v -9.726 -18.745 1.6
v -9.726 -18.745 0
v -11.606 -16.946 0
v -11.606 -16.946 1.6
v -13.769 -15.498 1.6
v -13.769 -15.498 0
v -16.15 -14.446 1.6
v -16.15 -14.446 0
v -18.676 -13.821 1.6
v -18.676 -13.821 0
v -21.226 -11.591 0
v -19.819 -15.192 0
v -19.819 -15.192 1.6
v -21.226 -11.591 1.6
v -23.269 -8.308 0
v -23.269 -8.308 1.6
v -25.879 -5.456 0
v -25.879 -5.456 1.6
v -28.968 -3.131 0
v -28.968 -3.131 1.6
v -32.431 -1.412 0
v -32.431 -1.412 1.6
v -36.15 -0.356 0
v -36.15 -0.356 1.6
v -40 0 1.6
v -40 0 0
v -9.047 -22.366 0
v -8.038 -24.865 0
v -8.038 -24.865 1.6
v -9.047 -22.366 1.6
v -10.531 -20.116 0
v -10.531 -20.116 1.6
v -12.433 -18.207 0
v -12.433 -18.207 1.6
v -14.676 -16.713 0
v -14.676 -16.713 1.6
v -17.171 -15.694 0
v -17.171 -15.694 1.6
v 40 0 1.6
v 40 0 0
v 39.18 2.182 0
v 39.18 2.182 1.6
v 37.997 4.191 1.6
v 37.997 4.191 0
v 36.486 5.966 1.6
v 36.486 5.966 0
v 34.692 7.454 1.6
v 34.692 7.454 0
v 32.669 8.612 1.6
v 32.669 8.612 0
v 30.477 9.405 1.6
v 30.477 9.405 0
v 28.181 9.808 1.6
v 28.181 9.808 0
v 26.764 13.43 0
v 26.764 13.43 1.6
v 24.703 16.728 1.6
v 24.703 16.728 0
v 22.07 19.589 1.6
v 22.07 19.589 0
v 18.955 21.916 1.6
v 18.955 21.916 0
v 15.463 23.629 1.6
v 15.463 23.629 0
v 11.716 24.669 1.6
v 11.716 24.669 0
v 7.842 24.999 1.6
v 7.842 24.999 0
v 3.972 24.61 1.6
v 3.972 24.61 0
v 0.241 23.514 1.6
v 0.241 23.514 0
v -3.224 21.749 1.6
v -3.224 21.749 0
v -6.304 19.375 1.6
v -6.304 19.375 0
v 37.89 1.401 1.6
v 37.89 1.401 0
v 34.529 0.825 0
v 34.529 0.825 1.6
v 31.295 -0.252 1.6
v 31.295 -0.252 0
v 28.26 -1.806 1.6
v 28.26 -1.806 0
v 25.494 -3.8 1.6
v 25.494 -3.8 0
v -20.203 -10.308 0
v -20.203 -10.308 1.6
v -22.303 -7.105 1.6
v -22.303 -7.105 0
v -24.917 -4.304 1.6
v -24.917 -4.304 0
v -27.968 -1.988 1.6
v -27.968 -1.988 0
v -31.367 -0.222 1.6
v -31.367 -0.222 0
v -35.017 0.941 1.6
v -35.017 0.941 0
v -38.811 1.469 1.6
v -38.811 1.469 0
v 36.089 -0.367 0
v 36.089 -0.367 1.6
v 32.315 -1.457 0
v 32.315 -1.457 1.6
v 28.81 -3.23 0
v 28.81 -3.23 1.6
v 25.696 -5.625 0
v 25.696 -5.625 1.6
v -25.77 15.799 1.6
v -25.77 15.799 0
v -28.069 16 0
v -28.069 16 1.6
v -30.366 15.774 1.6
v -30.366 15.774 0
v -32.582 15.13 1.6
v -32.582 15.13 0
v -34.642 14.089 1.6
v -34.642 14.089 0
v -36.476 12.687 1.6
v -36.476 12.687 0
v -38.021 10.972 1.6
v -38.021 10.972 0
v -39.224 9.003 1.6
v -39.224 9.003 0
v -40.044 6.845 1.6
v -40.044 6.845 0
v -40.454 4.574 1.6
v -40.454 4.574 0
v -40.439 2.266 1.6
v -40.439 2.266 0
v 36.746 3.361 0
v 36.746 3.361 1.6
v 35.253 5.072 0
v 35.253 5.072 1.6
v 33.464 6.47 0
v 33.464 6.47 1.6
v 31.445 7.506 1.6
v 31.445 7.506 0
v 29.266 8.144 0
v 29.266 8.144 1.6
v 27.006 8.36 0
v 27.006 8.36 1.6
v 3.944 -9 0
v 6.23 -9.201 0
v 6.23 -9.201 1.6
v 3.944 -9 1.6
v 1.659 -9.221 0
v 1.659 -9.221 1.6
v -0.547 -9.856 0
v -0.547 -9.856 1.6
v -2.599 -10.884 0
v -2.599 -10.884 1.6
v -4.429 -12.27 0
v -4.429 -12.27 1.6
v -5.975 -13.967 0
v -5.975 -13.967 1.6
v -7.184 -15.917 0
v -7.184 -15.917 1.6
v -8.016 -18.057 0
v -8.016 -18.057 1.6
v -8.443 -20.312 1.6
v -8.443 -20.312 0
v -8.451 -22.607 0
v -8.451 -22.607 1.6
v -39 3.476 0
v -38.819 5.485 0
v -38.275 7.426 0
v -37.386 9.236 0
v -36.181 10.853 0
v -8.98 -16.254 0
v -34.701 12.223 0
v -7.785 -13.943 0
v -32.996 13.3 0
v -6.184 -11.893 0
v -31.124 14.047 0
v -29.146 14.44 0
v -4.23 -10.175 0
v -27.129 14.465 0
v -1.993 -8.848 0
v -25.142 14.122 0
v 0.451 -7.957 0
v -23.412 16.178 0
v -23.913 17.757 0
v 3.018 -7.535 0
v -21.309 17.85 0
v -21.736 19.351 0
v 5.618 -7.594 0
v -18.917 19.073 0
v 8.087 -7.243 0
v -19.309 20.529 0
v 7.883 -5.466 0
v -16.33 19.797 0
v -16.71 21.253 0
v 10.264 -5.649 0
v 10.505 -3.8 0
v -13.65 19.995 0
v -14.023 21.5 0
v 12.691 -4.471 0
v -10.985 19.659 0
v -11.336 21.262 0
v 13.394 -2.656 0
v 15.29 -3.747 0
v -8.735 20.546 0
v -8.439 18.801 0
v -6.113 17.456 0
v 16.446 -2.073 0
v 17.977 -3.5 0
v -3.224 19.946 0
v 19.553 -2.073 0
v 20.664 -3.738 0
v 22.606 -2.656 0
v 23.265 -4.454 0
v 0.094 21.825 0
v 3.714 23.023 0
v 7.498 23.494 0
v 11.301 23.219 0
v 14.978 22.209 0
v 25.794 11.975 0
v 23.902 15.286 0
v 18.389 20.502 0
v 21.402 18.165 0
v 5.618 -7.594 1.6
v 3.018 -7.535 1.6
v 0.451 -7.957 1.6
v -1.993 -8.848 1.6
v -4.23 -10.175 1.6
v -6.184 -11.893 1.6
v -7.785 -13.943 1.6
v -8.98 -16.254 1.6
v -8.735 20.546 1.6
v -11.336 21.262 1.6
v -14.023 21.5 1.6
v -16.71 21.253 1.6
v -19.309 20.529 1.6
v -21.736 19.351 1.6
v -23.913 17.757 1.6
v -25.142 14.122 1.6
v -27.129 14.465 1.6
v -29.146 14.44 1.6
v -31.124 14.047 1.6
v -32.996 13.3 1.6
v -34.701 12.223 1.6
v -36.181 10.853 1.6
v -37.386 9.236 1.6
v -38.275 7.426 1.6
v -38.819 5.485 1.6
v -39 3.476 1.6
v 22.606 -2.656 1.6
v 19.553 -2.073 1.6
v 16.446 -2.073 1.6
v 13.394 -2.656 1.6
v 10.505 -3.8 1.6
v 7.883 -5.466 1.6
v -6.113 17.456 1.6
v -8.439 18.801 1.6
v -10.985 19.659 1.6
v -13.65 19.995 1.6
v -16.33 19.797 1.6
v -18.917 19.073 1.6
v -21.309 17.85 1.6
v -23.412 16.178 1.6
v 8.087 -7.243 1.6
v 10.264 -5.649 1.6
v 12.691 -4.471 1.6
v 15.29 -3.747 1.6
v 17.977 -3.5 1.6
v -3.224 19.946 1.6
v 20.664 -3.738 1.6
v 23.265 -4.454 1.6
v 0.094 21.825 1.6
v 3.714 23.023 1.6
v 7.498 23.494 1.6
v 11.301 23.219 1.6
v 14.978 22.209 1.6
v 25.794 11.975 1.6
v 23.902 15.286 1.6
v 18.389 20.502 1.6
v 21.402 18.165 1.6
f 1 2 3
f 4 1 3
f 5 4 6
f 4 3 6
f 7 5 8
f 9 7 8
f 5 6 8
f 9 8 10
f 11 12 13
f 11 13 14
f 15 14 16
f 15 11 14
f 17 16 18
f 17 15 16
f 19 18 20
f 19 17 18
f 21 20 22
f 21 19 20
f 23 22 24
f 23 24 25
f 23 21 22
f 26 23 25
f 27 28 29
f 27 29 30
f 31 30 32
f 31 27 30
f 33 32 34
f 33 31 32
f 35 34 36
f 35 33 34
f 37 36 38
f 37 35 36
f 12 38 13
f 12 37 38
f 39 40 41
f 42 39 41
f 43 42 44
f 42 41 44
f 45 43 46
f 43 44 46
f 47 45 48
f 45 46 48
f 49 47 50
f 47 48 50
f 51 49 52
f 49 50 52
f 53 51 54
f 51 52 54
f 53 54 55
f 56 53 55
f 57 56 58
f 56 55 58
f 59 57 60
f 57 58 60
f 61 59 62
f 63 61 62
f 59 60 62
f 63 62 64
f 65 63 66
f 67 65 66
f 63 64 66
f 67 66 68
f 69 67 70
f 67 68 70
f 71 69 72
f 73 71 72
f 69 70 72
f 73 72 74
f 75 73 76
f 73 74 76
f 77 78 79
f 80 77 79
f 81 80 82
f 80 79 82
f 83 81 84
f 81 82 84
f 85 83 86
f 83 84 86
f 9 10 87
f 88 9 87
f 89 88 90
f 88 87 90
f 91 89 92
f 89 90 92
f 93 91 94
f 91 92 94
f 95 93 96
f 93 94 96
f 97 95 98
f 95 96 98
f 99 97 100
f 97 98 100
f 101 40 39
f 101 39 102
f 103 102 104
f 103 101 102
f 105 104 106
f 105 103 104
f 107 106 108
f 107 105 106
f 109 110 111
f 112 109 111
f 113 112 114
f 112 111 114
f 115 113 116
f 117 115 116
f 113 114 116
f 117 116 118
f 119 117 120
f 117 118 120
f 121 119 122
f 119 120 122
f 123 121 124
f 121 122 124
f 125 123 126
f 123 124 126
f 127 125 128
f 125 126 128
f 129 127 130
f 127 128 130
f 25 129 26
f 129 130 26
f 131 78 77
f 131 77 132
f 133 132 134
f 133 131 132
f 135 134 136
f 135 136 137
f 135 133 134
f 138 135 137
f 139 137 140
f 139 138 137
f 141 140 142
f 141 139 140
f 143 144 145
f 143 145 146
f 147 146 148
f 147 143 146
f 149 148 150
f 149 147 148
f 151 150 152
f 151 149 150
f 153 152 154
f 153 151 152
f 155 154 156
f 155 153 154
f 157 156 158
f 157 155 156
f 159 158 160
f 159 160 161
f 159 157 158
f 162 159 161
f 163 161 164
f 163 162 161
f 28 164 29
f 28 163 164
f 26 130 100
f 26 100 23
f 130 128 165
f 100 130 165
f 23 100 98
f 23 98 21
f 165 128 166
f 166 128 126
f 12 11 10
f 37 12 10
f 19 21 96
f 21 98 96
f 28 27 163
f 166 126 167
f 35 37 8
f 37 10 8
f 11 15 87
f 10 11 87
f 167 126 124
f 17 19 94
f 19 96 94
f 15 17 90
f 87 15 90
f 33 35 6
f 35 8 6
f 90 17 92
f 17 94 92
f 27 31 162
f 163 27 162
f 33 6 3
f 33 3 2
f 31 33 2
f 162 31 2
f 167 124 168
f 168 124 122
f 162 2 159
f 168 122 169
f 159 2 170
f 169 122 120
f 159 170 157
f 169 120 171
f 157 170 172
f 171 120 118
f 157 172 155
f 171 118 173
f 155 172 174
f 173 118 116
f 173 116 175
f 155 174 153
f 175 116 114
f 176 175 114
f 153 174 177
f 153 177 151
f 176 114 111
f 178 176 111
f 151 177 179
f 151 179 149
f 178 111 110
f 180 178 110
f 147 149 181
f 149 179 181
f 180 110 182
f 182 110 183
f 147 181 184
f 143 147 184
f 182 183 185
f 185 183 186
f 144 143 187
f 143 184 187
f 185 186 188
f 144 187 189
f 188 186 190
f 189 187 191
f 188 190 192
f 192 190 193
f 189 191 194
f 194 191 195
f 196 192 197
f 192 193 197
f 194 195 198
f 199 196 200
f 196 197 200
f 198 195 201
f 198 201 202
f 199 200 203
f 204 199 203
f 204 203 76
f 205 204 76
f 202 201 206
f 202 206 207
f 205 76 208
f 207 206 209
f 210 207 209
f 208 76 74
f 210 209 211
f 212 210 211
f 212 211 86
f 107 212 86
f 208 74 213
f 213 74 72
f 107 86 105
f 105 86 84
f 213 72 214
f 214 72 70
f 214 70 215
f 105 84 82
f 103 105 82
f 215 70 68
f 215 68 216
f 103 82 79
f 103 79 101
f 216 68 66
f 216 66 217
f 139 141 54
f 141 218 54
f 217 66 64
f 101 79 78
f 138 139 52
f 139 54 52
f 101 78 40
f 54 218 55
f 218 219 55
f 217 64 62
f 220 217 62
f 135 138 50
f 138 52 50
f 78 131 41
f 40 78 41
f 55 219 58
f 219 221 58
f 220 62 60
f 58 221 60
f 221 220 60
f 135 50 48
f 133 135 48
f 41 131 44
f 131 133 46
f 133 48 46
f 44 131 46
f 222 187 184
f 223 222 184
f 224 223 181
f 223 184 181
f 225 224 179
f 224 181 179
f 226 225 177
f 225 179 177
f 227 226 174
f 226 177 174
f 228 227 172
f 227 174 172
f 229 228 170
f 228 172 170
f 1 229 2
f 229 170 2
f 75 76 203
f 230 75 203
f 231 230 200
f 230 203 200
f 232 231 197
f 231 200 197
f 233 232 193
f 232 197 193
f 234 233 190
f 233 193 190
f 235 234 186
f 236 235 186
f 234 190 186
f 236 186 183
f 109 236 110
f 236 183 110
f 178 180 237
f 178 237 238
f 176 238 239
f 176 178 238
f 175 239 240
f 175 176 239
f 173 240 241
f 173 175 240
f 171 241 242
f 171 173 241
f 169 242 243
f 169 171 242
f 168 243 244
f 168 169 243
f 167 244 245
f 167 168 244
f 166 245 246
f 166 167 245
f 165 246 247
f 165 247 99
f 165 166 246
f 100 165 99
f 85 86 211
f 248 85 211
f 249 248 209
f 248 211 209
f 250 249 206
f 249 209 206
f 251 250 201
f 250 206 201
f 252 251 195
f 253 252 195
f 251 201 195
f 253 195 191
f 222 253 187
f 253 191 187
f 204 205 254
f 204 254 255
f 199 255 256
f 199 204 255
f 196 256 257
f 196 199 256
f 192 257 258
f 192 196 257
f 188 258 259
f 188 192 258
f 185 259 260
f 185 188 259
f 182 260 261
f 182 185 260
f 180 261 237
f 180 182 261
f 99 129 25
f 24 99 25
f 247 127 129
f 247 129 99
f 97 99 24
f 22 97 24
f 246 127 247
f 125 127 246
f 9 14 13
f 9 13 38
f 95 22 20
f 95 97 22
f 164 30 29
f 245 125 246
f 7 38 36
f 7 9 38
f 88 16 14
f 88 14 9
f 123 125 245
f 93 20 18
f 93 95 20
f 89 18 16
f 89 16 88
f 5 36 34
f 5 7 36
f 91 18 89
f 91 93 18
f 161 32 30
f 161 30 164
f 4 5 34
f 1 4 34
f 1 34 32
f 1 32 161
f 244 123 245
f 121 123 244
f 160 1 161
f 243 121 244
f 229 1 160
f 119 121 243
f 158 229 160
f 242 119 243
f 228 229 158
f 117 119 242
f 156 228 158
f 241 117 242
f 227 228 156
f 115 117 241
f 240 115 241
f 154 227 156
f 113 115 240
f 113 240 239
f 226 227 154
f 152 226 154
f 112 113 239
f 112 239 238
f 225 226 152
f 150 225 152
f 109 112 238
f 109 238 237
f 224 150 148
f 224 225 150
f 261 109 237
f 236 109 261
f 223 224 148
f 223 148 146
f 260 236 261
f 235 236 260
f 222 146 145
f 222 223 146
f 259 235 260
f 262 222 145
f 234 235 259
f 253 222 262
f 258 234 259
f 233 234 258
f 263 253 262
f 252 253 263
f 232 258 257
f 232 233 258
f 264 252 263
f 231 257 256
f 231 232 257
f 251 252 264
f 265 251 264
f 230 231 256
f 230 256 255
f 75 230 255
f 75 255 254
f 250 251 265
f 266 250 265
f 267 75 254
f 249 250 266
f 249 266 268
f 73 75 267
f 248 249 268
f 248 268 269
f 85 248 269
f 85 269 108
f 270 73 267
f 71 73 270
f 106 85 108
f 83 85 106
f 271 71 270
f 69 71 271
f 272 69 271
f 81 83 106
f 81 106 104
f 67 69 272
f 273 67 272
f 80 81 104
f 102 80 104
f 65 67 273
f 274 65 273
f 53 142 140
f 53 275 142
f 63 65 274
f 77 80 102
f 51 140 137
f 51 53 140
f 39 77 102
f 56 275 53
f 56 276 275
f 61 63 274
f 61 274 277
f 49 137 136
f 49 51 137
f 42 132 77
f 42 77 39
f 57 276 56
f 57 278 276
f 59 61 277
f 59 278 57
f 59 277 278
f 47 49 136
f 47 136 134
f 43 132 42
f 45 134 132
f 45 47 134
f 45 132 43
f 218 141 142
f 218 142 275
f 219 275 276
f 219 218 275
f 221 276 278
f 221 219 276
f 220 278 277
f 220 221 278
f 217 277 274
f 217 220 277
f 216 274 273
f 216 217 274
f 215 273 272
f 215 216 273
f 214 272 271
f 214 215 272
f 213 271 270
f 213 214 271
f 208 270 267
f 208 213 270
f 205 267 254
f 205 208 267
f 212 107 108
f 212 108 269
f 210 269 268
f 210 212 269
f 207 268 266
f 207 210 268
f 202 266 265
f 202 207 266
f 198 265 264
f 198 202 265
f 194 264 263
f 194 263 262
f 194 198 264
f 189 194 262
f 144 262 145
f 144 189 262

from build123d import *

# Parameters (mm, degrees)
PAD_DEPTH = 1.6


with BuildPart() as part:
    # Sketch → Pad (new body)
    with BuildSketch(Plane.XY):
        with BuildLine():
            ThreePointArc((28.180802, 9.808205), (13.613929, 24.235706), (-6.303954, 19.375204))
            ThreePointArc((-6.303954, 19.375204), (-16.710147, 21.253139), (-25.769512, 15.799387))
            ThreePointArc((-25.769512, 15.799387), (-37.287949, 11.865644), (-40, 0))
            ThreePointArc((-19.819198, -15.191795), (-27.370121, -4.222451), (-40, 0))
            ThreePointArc((-8.038434, -24.865429), (-12.432827, -18.206764), (-19.819198, -15.191795))
            ThreePointArc((6.230488, -9.200613), (-5.240972, -13.082492), (-8.038434, -24.865429))
            ThreePointArc((25.696046, -5.624796), (15.289853, -3.746861), (6.230488, -9.200613))
            ThreePointArc((40, 0), (32.314926, -1.456724), (25.696046, -5.624796))
            ThreePointArc((40, 0), (35.621137, 6.748689), (28.180802, 9.808205))
        make_face()
        with BuildLine():
            ThreePointArc((-25.14228, 14.122309), (-35.472766, 11.572036), (-38.810792, 1.468551))
            ThreePointArc((-18.675961, -13.821187), (-26.392811, -3.080893), (-38.810792, 1.468551))
            ThreePointArc((-9.72633, -18.745392), (-13.769068, -15.497999), (-18.675961, -13.821187))
            ThreePointArc((5.618325, -7.593849), (-4.230442, -10.174814), (-9.72633, -18.745392))
            ThreePointArc((25.494301, -3.800154), (14.906517, -2.292583), (5.618325, -7.593849))
            ThreePointArc((37.889878, 1.400834), (31.294602, -0.252324), (25.494301, -3.800154))
            ThreePointArc((37.889878, 1.400834), (33.464455, 6.469882), (27.006338, 8.359943))
            ThreePointArc((27.006338, 8.359943), (13.164593, 22.803643), (-6.112904, 17.456446))
            ThreePointArc((-6.112904, 17.456446), (-16.329844, 19.797437), (-25.14228, 14.122309))
        make_face(mode=Mode.SUBTRACT)
    extrude(amount=PAD_DEPTH)


solid = part.part
